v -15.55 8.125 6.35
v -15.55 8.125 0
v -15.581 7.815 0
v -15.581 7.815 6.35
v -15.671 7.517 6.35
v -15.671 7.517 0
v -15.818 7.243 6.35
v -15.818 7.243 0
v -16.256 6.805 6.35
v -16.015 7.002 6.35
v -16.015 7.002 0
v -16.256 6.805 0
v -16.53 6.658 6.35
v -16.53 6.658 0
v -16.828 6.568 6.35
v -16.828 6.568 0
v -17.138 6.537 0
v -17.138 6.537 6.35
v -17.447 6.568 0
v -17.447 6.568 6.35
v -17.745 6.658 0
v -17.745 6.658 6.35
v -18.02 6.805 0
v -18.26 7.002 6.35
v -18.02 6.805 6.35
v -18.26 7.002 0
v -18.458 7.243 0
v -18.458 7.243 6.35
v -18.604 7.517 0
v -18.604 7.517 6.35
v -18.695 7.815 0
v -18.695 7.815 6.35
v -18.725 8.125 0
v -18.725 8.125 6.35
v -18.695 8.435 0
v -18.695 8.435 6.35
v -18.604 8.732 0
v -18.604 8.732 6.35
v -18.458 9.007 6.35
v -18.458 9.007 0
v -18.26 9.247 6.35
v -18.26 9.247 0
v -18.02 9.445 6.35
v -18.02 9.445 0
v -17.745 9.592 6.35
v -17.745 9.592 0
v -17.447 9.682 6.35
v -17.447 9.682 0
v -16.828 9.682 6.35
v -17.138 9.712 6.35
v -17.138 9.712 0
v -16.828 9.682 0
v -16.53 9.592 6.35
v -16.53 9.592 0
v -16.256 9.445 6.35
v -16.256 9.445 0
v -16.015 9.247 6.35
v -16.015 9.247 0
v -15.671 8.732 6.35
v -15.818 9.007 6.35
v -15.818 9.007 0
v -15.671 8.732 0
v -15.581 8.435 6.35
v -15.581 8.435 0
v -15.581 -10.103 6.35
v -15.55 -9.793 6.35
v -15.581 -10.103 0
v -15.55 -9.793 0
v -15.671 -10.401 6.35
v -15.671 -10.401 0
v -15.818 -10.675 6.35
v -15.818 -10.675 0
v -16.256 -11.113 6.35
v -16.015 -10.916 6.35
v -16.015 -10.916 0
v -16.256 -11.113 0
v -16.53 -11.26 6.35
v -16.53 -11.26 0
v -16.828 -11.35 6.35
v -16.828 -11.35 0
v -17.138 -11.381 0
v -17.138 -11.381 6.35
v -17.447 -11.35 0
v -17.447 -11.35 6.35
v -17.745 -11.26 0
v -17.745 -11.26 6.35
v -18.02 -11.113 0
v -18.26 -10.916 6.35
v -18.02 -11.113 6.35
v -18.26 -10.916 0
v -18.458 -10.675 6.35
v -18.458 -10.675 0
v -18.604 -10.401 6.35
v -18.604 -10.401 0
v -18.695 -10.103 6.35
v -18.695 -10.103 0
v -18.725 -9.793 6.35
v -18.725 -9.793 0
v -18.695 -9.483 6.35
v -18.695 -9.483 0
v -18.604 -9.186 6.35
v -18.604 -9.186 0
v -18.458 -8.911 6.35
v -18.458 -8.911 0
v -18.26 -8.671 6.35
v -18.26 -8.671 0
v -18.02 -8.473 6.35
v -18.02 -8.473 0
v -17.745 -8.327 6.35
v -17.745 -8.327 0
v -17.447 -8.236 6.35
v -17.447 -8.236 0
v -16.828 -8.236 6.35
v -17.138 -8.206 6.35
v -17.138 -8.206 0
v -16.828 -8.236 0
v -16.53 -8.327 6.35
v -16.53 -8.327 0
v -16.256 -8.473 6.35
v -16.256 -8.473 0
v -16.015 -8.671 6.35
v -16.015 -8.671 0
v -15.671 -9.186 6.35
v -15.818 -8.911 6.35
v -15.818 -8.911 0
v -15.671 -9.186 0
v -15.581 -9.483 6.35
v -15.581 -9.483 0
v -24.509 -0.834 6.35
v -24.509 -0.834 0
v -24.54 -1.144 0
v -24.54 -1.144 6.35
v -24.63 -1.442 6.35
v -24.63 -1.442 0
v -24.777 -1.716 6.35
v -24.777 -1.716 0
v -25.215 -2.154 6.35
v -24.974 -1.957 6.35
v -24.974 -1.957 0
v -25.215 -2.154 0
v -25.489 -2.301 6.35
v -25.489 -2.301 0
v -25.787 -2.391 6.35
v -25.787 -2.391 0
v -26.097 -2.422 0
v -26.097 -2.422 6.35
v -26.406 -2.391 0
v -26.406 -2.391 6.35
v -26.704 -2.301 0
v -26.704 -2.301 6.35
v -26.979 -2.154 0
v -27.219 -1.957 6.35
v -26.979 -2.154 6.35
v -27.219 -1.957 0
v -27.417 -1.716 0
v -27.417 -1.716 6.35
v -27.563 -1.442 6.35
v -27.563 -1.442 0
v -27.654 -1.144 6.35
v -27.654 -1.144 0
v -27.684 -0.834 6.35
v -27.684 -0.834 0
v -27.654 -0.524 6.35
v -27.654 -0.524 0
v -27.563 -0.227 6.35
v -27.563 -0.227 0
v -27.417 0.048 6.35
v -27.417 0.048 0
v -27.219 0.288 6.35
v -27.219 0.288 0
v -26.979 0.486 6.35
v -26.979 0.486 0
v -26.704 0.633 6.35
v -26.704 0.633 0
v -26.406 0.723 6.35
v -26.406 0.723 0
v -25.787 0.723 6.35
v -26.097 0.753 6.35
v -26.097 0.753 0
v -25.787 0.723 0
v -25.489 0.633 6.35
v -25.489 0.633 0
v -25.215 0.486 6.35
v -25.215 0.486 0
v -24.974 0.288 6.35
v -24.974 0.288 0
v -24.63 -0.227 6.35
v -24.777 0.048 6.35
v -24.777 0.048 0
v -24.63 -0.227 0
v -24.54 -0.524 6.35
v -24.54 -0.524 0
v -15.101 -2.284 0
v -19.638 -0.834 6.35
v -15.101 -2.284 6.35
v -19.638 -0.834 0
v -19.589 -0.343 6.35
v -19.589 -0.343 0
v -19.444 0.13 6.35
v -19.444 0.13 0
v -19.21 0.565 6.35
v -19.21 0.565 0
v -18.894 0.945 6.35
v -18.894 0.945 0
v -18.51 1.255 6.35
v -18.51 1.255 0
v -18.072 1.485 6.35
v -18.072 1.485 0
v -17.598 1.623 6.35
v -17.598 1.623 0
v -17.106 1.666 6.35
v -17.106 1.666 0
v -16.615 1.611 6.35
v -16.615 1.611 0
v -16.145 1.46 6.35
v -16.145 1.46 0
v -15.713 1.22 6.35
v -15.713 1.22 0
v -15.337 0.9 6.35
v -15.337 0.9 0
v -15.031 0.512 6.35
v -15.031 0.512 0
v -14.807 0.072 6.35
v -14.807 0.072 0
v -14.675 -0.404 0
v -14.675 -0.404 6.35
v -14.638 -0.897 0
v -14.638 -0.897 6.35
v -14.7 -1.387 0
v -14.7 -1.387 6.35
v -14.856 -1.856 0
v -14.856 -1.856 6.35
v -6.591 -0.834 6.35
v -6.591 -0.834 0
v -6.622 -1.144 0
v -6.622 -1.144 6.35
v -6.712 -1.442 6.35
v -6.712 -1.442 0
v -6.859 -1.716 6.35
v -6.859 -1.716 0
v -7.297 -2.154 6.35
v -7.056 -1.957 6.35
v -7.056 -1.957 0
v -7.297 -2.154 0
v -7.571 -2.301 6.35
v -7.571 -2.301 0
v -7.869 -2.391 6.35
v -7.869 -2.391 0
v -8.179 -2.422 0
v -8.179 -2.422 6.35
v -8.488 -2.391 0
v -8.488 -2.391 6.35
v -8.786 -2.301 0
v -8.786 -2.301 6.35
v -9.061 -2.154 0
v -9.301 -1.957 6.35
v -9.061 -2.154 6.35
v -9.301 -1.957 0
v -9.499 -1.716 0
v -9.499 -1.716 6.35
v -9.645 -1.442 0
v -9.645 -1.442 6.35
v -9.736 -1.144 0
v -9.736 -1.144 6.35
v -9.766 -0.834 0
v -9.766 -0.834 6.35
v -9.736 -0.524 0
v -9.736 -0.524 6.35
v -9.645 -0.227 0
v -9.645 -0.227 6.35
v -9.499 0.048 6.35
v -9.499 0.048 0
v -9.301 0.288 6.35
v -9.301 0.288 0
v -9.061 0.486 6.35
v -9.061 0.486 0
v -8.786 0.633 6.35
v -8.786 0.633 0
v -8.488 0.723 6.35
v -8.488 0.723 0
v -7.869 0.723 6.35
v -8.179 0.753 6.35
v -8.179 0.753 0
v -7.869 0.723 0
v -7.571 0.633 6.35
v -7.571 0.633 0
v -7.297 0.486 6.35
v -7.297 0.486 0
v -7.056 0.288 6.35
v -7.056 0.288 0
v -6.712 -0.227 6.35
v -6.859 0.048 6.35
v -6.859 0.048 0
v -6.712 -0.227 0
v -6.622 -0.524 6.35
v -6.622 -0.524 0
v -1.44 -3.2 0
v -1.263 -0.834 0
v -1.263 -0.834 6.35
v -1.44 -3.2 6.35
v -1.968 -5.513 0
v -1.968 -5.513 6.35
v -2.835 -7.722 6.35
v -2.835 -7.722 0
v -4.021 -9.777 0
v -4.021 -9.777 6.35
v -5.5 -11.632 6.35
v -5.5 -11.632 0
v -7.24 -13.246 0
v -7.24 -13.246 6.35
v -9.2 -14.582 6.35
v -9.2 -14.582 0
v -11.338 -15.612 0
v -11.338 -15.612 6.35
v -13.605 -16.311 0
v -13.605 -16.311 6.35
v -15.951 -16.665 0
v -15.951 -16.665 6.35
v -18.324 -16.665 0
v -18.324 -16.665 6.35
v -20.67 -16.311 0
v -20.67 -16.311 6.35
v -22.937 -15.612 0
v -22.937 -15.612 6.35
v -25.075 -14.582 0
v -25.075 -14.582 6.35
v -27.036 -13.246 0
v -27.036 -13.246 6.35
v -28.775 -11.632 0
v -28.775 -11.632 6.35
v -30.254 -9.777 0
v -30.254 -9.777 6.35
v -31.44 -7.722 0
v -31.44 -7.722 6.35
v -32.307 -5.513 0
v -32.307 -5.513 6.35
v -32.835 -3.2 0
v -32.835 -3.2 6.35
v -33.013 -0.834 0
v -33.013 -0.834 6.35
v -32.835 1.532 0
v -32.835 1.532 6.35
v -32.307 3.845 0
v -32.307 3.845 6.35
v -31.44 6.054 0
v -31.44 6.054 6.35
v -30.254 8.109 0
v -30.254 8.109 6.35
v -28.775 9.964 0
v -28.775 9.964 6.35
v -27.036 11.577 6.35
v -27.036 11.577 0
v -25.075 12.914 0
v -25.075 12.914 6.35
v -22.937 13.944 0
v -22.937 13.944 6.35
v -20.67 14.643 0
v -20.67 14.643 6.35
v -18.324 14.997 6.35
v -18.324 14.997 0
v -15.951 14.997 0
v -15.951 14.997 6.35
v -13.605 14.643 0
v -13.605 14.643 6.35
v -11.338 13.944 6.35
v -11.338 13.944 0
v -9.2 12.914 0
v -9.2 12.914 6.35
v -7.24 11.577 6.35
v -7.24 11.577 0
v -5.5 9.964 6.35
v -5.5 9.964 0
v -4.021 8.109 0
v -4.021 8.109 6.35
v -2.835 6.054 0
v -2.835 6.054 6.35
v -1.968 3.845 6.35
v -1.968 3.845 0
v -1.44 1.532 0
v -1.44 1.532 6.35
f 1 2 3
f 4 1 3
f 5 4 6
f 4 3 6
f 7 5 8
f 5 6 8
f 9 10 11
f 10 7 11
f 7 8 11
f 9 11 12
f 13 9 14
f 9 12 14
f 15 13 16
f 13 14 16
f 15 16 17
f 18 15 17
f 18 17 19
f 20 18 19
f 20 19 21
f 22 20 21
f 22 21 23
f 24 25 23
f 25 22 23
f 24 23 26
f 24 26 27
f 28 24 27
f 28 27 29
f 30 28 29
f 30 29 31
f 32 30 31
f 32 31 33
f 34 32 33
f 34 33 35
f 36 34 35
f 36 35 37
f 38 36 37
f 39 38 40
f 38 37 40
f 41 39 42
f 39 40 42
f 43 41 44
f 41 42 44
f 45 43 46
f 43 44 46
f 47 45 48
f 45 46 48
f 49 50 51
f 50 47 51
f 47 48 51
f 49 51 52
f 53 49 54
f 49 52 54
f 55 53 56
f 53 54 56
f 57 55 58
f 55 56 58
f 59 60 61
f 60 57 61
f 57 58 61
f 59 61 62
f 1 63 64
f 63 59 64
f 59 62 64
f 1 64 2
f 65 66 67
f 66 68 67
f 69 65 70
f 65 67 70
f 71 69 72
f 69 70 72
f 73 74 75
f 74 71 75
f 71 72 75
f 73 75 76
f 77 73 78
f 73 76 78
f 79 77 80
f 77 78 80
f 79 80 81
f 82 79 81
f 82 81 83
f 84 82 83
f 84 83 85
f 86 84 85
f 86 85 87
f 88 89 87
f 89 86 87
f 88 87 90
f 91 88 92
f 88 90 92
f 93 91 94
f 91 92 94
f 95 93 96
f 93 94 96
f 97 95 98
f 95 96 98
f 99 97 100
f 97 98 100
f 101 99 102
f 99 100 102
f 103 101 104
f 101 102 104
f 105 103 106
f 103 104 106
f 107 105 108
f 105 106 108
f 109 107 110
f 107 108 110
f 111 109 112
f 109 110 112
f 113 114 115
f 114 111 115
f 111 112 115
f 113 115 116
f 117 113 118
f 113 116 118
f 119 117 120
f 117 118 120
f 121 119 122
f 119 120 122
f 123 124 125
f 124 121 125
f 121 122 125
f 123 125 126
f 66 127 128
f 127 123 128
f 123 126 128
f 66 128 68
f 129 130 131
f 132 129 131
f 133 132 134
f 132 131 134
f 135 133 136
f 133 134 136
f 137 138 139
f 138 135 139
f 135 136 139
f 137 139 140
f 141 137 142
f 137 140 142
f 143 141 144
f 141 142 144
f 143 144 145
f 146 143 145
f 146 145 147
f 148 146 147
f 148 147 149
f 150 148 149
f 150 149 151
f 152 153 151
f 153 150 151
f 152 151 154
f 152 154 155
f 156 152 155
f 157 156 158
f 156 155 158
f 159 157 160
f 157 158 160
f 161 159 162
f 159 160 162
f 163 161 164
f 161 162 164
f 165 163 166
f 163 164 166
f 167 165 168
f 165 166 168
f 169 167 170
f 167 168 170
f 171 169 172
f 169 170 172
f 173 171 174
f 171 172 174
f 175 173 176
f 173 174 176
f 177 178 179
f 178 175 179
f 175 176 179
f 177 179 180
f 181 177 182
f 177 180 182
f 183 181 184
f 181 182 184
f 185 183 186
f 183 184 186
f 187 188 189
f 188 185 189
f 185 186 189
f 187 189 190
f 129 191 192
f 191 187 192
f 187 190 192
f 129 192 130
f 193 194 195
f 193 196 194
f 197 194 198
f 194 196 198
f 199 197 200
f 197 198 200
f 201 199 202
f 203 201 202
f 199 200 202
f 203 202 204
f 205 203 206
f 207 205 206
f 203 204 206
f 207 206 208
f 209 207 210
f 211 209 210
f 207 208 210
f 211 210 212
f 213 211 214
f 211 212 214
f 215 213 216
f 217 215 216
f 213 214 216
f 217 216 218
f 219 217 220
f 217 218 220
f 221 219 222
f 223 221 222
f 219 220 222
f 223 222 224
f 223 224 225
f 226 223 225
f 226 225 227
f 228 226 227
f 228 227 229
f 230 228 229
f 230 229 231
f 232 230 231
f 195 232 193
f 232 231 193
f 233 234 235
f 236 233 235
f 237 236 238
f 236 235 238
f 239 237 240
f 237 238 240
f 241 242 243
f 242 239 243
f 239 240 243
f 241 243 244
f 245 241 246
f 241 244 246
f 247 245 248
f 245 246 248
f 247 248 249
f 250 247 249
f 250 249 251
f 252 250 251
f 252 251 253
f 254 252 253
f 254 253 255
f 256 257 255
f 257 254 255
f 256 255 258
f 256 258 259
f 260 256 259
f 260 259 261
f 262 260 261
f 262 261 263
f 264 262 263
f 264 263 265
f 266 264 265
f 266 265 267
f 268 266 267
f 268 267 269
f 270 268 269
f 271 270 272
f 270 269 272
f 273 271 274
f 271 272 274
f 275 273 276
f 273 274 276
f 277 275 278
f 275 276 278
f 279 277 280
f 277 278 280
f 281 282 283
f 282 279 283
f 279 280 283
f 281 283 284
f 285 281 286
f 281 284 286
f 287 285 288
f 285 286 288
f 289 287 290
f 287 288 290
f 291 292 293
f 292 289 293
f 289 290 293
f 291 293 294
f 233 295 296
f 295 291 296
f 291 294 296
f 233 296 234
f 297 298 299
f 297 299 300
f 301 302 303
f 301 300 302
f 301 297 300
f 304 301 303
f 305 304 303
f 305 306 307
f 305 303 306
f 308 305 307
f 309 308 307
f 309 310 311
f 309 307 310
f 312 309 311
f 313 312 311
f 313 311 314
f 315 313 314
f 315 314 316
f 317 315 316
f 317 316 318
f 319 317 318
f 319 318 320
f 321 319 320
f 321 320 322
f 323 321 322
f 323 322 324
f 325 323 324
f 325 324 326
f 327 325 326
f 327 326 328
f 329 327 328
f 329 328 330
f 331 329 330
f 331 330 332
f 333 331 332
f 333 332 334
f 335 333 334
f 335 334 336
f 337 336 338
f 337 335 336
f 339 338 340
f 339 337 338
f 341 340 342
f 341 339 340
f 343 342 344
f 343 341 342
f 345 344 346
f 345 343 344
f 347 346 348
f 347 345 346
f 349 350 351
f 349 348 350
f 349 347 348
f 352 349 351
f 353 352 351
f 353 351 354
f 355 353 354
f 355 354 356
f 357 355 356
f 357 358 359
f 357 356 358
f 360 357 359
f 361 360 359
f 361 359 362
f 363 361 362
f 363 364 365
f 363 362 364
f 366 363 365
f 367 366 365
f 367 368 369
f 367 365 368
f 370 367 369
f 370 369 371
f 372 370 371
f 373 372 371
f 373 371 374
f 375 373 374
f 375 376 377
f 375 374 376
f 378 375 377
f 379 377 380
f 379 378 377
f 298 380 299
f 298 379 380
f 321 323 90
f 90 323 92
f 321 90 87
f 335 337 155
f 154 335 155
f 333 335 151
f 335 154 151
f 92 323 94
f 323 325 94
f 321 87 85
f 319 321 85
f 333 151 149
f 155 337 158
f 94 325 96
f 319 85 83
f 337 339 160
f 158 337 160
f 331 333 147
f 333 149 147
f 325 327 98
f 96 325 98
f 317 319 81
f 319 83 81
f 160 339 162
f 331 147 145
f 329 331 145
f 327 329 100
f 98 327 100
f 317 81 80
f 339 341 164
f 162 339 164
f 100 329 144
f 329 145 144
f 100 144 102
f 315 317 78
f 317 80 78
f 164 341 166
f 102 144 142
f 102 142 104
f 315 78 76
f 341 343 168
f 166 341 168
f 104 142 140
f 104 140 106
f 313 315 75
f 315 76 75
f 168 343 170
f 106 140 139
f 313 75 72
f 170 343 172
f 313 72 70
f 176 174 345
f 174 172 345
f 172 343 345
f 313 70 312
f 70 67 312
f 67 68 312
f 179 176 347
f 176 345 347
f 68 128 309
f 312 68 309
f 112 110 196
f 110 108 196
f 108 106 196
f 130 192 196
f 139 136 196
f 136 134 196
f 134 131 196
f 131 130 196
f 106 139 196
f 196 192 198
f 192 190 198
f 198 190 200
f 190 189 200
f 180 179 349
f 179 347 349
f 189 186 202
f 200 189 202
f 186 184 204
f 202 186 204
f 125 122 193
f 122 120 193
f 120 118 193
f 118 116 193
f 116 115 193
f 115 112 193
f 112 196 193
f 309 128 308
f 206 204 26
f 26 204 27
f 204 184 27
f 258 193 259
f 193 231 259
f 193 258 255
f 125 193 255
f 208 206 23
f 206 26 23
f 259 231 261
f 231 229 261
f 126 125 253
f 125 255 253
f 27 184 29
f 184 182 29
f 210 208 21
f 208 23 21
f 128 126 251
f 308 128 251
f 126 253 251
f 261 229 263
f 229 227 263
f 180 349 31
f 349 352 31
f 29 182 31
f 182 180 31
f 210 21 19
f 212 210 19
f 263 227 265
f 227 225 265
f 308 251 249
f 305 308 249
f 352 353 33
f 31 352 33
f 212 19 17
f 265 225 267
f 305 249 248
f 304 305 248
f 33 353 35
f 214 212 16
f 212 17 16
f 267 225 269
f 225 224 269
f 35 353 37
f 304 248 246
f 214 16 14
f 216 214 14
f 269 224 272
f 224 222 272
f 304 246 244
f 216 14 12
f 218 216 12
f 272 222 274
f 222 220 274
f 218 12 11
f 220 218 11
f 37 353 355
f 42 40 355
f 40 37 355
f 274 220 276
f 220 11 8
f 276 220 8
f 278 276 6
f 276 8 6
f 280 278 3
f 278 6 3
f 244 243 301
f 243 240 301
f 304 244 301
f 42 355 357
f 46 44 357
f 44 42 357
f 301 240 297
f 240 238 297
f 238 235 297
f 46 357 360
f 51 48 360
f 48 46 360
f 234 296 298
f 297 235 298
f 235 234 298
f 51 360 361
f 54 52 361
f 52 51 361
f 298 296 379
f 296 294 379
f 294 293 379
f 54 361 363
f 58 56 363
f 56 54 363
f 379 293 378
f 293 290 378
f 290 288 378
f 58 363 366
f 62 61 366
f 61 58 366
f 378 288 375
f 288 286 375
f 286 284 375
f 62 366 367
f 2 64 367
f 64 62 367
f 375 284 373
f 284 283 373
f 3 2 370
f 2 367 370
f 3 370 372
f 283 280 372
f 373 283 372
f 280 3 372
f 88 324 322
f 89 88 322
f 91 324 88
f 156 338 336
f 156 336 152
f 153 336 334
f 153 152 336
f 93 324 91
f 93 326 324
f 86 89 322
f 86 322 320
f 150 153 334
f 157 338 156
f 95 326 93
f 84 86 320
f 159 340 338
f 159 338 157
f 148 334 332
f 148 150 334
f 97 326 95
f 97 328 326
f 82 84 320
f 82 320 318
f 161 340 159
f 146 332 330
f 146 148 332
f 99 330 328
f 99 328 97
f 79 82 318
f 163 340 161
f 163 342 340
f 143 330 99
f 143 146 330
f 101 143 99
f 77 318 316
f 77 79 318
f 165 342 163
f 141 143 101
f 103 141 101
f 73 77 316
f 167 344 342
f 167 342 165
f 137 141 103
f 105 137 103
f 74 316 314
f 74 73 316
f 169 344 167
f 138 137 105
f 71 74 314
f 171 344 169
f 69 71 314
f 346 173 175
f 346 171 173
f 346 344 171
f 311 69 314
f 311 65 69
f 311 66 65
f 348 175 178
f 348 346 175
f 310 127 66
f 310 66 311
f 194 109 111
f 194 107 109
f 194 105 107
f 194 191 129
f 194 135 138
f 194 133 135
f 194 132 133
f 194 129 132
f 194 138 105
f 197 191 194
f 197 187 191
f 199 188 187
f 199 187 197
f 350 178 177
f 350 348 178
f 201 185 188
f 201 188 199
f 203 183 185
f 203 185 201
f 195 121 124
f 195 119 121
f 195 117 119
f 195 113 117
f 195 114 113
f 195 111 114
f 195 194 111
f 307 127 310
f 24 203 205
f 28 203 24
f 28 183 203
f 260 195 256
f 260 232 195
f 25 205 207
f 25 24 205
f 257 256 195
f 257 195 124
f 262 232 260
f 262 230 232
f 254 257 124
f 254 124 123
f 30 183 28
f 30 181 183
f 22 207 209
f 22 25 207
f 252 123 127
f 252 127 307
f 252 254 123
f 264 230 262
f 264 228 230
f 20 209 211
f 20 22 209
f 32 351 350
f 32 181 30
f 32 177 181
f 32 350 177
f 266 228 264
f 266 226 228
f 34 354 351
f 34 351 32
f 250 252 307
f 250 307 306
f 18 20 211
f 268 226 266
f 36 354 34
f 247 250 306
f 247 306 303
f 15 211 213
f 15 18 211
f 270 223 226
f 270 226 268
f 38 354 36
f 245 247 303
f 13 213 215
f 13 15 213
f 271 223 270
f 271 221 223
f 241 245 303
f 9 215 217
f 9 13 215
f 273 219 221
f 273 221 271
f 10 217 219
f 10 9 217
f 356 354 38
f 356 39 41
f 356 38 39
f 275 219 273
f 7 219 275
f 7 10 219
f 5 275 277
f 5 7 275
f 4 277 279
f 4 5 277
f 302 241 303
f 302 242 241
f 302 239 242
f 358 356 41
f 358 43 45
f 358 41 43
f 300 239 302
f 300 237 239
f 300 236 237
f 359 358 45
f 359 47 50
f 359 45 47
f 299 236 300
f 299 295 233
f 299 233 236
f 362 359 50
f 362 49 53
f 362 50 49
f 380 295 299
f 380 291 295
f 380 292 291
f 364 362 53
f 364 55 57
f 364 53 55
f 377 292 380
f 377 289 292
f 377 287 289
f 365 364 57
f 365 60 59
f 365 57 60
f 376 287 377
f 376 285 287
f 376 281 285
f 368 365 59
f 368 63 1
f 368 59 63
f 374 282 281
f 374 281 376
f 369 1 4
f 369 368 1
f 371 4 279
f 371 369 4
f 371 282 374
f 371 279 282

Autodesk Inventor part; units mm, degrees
ref_plane "YZ Plane" through (0, 0, 0) normal (1, 0, 0) x (0, 1, 0)
ref_plane "XZ Plane" through (0, 0, 0) normal (0, 1, 0) x (-1, 0, 0)
ref_plane "XY Plane" through (0, 0, 0) normal (0, 0, 1) x (1, 0, 0)
sketch "Sketch1" plane through (0, 0, 0) normal (0, 0, 1) x (1, 0, 0)
  circle A0 centre (-17.1376, -0.8341) radius 15.875
  circle A1 centre (-17.1376, -9.7932) radius 1.5875
  circle A2 centre (-8.1786, -0.8341) radius 1.5875
  circle A3 centre (-17.1376, 8.1249) radius 1.5875
  circle A4 centre (-26.0966, -0.8341) radius 1.5875
  line L0 (-19.6376, -0.8341) -> (-15.1013, -2.2845)
  arc A5 (-15.1013, -2.2845) -> (-19.6376, -0.8341) centre (-17.1376, -0.8341) ccw
  arc A6 (-15.1013, -2.2845) -> (-19.6376, -0.8341) centre (-17.1376, -0.8341) ccw
  arc A7 (-15.1013, -2.2845) -> (-19.6376, -0.8341) centre (-17.1376, -0.8341) ccw
  point P0 (0, 0)
  dimension "d0" = 5
  dimension "d1" = 31.75
  dimension "d2" = 3.175
  dimension "d5" = 360
extrude "Extrusion1" add sketch "Sketch1" along normal blind 6.35 contours A0 | A5 L0
sketch "Sketch2" plane through (-17.1376, -0.8341, 0) normal (0, 0, -1) x (-1, 0, 0)
  line L0 (2.5, 0) -> (-2.0363, -1.4504)
  arc A0 (2.5, 0) -> (-2.0363, -1.4504) centre (0, 0) ccw
  point P0 (-17.1376, 0.8341)
extrude "Extrusion2" cut sketch "Sketch2" against normal through all
properties part number "stepperShaftCollar"
